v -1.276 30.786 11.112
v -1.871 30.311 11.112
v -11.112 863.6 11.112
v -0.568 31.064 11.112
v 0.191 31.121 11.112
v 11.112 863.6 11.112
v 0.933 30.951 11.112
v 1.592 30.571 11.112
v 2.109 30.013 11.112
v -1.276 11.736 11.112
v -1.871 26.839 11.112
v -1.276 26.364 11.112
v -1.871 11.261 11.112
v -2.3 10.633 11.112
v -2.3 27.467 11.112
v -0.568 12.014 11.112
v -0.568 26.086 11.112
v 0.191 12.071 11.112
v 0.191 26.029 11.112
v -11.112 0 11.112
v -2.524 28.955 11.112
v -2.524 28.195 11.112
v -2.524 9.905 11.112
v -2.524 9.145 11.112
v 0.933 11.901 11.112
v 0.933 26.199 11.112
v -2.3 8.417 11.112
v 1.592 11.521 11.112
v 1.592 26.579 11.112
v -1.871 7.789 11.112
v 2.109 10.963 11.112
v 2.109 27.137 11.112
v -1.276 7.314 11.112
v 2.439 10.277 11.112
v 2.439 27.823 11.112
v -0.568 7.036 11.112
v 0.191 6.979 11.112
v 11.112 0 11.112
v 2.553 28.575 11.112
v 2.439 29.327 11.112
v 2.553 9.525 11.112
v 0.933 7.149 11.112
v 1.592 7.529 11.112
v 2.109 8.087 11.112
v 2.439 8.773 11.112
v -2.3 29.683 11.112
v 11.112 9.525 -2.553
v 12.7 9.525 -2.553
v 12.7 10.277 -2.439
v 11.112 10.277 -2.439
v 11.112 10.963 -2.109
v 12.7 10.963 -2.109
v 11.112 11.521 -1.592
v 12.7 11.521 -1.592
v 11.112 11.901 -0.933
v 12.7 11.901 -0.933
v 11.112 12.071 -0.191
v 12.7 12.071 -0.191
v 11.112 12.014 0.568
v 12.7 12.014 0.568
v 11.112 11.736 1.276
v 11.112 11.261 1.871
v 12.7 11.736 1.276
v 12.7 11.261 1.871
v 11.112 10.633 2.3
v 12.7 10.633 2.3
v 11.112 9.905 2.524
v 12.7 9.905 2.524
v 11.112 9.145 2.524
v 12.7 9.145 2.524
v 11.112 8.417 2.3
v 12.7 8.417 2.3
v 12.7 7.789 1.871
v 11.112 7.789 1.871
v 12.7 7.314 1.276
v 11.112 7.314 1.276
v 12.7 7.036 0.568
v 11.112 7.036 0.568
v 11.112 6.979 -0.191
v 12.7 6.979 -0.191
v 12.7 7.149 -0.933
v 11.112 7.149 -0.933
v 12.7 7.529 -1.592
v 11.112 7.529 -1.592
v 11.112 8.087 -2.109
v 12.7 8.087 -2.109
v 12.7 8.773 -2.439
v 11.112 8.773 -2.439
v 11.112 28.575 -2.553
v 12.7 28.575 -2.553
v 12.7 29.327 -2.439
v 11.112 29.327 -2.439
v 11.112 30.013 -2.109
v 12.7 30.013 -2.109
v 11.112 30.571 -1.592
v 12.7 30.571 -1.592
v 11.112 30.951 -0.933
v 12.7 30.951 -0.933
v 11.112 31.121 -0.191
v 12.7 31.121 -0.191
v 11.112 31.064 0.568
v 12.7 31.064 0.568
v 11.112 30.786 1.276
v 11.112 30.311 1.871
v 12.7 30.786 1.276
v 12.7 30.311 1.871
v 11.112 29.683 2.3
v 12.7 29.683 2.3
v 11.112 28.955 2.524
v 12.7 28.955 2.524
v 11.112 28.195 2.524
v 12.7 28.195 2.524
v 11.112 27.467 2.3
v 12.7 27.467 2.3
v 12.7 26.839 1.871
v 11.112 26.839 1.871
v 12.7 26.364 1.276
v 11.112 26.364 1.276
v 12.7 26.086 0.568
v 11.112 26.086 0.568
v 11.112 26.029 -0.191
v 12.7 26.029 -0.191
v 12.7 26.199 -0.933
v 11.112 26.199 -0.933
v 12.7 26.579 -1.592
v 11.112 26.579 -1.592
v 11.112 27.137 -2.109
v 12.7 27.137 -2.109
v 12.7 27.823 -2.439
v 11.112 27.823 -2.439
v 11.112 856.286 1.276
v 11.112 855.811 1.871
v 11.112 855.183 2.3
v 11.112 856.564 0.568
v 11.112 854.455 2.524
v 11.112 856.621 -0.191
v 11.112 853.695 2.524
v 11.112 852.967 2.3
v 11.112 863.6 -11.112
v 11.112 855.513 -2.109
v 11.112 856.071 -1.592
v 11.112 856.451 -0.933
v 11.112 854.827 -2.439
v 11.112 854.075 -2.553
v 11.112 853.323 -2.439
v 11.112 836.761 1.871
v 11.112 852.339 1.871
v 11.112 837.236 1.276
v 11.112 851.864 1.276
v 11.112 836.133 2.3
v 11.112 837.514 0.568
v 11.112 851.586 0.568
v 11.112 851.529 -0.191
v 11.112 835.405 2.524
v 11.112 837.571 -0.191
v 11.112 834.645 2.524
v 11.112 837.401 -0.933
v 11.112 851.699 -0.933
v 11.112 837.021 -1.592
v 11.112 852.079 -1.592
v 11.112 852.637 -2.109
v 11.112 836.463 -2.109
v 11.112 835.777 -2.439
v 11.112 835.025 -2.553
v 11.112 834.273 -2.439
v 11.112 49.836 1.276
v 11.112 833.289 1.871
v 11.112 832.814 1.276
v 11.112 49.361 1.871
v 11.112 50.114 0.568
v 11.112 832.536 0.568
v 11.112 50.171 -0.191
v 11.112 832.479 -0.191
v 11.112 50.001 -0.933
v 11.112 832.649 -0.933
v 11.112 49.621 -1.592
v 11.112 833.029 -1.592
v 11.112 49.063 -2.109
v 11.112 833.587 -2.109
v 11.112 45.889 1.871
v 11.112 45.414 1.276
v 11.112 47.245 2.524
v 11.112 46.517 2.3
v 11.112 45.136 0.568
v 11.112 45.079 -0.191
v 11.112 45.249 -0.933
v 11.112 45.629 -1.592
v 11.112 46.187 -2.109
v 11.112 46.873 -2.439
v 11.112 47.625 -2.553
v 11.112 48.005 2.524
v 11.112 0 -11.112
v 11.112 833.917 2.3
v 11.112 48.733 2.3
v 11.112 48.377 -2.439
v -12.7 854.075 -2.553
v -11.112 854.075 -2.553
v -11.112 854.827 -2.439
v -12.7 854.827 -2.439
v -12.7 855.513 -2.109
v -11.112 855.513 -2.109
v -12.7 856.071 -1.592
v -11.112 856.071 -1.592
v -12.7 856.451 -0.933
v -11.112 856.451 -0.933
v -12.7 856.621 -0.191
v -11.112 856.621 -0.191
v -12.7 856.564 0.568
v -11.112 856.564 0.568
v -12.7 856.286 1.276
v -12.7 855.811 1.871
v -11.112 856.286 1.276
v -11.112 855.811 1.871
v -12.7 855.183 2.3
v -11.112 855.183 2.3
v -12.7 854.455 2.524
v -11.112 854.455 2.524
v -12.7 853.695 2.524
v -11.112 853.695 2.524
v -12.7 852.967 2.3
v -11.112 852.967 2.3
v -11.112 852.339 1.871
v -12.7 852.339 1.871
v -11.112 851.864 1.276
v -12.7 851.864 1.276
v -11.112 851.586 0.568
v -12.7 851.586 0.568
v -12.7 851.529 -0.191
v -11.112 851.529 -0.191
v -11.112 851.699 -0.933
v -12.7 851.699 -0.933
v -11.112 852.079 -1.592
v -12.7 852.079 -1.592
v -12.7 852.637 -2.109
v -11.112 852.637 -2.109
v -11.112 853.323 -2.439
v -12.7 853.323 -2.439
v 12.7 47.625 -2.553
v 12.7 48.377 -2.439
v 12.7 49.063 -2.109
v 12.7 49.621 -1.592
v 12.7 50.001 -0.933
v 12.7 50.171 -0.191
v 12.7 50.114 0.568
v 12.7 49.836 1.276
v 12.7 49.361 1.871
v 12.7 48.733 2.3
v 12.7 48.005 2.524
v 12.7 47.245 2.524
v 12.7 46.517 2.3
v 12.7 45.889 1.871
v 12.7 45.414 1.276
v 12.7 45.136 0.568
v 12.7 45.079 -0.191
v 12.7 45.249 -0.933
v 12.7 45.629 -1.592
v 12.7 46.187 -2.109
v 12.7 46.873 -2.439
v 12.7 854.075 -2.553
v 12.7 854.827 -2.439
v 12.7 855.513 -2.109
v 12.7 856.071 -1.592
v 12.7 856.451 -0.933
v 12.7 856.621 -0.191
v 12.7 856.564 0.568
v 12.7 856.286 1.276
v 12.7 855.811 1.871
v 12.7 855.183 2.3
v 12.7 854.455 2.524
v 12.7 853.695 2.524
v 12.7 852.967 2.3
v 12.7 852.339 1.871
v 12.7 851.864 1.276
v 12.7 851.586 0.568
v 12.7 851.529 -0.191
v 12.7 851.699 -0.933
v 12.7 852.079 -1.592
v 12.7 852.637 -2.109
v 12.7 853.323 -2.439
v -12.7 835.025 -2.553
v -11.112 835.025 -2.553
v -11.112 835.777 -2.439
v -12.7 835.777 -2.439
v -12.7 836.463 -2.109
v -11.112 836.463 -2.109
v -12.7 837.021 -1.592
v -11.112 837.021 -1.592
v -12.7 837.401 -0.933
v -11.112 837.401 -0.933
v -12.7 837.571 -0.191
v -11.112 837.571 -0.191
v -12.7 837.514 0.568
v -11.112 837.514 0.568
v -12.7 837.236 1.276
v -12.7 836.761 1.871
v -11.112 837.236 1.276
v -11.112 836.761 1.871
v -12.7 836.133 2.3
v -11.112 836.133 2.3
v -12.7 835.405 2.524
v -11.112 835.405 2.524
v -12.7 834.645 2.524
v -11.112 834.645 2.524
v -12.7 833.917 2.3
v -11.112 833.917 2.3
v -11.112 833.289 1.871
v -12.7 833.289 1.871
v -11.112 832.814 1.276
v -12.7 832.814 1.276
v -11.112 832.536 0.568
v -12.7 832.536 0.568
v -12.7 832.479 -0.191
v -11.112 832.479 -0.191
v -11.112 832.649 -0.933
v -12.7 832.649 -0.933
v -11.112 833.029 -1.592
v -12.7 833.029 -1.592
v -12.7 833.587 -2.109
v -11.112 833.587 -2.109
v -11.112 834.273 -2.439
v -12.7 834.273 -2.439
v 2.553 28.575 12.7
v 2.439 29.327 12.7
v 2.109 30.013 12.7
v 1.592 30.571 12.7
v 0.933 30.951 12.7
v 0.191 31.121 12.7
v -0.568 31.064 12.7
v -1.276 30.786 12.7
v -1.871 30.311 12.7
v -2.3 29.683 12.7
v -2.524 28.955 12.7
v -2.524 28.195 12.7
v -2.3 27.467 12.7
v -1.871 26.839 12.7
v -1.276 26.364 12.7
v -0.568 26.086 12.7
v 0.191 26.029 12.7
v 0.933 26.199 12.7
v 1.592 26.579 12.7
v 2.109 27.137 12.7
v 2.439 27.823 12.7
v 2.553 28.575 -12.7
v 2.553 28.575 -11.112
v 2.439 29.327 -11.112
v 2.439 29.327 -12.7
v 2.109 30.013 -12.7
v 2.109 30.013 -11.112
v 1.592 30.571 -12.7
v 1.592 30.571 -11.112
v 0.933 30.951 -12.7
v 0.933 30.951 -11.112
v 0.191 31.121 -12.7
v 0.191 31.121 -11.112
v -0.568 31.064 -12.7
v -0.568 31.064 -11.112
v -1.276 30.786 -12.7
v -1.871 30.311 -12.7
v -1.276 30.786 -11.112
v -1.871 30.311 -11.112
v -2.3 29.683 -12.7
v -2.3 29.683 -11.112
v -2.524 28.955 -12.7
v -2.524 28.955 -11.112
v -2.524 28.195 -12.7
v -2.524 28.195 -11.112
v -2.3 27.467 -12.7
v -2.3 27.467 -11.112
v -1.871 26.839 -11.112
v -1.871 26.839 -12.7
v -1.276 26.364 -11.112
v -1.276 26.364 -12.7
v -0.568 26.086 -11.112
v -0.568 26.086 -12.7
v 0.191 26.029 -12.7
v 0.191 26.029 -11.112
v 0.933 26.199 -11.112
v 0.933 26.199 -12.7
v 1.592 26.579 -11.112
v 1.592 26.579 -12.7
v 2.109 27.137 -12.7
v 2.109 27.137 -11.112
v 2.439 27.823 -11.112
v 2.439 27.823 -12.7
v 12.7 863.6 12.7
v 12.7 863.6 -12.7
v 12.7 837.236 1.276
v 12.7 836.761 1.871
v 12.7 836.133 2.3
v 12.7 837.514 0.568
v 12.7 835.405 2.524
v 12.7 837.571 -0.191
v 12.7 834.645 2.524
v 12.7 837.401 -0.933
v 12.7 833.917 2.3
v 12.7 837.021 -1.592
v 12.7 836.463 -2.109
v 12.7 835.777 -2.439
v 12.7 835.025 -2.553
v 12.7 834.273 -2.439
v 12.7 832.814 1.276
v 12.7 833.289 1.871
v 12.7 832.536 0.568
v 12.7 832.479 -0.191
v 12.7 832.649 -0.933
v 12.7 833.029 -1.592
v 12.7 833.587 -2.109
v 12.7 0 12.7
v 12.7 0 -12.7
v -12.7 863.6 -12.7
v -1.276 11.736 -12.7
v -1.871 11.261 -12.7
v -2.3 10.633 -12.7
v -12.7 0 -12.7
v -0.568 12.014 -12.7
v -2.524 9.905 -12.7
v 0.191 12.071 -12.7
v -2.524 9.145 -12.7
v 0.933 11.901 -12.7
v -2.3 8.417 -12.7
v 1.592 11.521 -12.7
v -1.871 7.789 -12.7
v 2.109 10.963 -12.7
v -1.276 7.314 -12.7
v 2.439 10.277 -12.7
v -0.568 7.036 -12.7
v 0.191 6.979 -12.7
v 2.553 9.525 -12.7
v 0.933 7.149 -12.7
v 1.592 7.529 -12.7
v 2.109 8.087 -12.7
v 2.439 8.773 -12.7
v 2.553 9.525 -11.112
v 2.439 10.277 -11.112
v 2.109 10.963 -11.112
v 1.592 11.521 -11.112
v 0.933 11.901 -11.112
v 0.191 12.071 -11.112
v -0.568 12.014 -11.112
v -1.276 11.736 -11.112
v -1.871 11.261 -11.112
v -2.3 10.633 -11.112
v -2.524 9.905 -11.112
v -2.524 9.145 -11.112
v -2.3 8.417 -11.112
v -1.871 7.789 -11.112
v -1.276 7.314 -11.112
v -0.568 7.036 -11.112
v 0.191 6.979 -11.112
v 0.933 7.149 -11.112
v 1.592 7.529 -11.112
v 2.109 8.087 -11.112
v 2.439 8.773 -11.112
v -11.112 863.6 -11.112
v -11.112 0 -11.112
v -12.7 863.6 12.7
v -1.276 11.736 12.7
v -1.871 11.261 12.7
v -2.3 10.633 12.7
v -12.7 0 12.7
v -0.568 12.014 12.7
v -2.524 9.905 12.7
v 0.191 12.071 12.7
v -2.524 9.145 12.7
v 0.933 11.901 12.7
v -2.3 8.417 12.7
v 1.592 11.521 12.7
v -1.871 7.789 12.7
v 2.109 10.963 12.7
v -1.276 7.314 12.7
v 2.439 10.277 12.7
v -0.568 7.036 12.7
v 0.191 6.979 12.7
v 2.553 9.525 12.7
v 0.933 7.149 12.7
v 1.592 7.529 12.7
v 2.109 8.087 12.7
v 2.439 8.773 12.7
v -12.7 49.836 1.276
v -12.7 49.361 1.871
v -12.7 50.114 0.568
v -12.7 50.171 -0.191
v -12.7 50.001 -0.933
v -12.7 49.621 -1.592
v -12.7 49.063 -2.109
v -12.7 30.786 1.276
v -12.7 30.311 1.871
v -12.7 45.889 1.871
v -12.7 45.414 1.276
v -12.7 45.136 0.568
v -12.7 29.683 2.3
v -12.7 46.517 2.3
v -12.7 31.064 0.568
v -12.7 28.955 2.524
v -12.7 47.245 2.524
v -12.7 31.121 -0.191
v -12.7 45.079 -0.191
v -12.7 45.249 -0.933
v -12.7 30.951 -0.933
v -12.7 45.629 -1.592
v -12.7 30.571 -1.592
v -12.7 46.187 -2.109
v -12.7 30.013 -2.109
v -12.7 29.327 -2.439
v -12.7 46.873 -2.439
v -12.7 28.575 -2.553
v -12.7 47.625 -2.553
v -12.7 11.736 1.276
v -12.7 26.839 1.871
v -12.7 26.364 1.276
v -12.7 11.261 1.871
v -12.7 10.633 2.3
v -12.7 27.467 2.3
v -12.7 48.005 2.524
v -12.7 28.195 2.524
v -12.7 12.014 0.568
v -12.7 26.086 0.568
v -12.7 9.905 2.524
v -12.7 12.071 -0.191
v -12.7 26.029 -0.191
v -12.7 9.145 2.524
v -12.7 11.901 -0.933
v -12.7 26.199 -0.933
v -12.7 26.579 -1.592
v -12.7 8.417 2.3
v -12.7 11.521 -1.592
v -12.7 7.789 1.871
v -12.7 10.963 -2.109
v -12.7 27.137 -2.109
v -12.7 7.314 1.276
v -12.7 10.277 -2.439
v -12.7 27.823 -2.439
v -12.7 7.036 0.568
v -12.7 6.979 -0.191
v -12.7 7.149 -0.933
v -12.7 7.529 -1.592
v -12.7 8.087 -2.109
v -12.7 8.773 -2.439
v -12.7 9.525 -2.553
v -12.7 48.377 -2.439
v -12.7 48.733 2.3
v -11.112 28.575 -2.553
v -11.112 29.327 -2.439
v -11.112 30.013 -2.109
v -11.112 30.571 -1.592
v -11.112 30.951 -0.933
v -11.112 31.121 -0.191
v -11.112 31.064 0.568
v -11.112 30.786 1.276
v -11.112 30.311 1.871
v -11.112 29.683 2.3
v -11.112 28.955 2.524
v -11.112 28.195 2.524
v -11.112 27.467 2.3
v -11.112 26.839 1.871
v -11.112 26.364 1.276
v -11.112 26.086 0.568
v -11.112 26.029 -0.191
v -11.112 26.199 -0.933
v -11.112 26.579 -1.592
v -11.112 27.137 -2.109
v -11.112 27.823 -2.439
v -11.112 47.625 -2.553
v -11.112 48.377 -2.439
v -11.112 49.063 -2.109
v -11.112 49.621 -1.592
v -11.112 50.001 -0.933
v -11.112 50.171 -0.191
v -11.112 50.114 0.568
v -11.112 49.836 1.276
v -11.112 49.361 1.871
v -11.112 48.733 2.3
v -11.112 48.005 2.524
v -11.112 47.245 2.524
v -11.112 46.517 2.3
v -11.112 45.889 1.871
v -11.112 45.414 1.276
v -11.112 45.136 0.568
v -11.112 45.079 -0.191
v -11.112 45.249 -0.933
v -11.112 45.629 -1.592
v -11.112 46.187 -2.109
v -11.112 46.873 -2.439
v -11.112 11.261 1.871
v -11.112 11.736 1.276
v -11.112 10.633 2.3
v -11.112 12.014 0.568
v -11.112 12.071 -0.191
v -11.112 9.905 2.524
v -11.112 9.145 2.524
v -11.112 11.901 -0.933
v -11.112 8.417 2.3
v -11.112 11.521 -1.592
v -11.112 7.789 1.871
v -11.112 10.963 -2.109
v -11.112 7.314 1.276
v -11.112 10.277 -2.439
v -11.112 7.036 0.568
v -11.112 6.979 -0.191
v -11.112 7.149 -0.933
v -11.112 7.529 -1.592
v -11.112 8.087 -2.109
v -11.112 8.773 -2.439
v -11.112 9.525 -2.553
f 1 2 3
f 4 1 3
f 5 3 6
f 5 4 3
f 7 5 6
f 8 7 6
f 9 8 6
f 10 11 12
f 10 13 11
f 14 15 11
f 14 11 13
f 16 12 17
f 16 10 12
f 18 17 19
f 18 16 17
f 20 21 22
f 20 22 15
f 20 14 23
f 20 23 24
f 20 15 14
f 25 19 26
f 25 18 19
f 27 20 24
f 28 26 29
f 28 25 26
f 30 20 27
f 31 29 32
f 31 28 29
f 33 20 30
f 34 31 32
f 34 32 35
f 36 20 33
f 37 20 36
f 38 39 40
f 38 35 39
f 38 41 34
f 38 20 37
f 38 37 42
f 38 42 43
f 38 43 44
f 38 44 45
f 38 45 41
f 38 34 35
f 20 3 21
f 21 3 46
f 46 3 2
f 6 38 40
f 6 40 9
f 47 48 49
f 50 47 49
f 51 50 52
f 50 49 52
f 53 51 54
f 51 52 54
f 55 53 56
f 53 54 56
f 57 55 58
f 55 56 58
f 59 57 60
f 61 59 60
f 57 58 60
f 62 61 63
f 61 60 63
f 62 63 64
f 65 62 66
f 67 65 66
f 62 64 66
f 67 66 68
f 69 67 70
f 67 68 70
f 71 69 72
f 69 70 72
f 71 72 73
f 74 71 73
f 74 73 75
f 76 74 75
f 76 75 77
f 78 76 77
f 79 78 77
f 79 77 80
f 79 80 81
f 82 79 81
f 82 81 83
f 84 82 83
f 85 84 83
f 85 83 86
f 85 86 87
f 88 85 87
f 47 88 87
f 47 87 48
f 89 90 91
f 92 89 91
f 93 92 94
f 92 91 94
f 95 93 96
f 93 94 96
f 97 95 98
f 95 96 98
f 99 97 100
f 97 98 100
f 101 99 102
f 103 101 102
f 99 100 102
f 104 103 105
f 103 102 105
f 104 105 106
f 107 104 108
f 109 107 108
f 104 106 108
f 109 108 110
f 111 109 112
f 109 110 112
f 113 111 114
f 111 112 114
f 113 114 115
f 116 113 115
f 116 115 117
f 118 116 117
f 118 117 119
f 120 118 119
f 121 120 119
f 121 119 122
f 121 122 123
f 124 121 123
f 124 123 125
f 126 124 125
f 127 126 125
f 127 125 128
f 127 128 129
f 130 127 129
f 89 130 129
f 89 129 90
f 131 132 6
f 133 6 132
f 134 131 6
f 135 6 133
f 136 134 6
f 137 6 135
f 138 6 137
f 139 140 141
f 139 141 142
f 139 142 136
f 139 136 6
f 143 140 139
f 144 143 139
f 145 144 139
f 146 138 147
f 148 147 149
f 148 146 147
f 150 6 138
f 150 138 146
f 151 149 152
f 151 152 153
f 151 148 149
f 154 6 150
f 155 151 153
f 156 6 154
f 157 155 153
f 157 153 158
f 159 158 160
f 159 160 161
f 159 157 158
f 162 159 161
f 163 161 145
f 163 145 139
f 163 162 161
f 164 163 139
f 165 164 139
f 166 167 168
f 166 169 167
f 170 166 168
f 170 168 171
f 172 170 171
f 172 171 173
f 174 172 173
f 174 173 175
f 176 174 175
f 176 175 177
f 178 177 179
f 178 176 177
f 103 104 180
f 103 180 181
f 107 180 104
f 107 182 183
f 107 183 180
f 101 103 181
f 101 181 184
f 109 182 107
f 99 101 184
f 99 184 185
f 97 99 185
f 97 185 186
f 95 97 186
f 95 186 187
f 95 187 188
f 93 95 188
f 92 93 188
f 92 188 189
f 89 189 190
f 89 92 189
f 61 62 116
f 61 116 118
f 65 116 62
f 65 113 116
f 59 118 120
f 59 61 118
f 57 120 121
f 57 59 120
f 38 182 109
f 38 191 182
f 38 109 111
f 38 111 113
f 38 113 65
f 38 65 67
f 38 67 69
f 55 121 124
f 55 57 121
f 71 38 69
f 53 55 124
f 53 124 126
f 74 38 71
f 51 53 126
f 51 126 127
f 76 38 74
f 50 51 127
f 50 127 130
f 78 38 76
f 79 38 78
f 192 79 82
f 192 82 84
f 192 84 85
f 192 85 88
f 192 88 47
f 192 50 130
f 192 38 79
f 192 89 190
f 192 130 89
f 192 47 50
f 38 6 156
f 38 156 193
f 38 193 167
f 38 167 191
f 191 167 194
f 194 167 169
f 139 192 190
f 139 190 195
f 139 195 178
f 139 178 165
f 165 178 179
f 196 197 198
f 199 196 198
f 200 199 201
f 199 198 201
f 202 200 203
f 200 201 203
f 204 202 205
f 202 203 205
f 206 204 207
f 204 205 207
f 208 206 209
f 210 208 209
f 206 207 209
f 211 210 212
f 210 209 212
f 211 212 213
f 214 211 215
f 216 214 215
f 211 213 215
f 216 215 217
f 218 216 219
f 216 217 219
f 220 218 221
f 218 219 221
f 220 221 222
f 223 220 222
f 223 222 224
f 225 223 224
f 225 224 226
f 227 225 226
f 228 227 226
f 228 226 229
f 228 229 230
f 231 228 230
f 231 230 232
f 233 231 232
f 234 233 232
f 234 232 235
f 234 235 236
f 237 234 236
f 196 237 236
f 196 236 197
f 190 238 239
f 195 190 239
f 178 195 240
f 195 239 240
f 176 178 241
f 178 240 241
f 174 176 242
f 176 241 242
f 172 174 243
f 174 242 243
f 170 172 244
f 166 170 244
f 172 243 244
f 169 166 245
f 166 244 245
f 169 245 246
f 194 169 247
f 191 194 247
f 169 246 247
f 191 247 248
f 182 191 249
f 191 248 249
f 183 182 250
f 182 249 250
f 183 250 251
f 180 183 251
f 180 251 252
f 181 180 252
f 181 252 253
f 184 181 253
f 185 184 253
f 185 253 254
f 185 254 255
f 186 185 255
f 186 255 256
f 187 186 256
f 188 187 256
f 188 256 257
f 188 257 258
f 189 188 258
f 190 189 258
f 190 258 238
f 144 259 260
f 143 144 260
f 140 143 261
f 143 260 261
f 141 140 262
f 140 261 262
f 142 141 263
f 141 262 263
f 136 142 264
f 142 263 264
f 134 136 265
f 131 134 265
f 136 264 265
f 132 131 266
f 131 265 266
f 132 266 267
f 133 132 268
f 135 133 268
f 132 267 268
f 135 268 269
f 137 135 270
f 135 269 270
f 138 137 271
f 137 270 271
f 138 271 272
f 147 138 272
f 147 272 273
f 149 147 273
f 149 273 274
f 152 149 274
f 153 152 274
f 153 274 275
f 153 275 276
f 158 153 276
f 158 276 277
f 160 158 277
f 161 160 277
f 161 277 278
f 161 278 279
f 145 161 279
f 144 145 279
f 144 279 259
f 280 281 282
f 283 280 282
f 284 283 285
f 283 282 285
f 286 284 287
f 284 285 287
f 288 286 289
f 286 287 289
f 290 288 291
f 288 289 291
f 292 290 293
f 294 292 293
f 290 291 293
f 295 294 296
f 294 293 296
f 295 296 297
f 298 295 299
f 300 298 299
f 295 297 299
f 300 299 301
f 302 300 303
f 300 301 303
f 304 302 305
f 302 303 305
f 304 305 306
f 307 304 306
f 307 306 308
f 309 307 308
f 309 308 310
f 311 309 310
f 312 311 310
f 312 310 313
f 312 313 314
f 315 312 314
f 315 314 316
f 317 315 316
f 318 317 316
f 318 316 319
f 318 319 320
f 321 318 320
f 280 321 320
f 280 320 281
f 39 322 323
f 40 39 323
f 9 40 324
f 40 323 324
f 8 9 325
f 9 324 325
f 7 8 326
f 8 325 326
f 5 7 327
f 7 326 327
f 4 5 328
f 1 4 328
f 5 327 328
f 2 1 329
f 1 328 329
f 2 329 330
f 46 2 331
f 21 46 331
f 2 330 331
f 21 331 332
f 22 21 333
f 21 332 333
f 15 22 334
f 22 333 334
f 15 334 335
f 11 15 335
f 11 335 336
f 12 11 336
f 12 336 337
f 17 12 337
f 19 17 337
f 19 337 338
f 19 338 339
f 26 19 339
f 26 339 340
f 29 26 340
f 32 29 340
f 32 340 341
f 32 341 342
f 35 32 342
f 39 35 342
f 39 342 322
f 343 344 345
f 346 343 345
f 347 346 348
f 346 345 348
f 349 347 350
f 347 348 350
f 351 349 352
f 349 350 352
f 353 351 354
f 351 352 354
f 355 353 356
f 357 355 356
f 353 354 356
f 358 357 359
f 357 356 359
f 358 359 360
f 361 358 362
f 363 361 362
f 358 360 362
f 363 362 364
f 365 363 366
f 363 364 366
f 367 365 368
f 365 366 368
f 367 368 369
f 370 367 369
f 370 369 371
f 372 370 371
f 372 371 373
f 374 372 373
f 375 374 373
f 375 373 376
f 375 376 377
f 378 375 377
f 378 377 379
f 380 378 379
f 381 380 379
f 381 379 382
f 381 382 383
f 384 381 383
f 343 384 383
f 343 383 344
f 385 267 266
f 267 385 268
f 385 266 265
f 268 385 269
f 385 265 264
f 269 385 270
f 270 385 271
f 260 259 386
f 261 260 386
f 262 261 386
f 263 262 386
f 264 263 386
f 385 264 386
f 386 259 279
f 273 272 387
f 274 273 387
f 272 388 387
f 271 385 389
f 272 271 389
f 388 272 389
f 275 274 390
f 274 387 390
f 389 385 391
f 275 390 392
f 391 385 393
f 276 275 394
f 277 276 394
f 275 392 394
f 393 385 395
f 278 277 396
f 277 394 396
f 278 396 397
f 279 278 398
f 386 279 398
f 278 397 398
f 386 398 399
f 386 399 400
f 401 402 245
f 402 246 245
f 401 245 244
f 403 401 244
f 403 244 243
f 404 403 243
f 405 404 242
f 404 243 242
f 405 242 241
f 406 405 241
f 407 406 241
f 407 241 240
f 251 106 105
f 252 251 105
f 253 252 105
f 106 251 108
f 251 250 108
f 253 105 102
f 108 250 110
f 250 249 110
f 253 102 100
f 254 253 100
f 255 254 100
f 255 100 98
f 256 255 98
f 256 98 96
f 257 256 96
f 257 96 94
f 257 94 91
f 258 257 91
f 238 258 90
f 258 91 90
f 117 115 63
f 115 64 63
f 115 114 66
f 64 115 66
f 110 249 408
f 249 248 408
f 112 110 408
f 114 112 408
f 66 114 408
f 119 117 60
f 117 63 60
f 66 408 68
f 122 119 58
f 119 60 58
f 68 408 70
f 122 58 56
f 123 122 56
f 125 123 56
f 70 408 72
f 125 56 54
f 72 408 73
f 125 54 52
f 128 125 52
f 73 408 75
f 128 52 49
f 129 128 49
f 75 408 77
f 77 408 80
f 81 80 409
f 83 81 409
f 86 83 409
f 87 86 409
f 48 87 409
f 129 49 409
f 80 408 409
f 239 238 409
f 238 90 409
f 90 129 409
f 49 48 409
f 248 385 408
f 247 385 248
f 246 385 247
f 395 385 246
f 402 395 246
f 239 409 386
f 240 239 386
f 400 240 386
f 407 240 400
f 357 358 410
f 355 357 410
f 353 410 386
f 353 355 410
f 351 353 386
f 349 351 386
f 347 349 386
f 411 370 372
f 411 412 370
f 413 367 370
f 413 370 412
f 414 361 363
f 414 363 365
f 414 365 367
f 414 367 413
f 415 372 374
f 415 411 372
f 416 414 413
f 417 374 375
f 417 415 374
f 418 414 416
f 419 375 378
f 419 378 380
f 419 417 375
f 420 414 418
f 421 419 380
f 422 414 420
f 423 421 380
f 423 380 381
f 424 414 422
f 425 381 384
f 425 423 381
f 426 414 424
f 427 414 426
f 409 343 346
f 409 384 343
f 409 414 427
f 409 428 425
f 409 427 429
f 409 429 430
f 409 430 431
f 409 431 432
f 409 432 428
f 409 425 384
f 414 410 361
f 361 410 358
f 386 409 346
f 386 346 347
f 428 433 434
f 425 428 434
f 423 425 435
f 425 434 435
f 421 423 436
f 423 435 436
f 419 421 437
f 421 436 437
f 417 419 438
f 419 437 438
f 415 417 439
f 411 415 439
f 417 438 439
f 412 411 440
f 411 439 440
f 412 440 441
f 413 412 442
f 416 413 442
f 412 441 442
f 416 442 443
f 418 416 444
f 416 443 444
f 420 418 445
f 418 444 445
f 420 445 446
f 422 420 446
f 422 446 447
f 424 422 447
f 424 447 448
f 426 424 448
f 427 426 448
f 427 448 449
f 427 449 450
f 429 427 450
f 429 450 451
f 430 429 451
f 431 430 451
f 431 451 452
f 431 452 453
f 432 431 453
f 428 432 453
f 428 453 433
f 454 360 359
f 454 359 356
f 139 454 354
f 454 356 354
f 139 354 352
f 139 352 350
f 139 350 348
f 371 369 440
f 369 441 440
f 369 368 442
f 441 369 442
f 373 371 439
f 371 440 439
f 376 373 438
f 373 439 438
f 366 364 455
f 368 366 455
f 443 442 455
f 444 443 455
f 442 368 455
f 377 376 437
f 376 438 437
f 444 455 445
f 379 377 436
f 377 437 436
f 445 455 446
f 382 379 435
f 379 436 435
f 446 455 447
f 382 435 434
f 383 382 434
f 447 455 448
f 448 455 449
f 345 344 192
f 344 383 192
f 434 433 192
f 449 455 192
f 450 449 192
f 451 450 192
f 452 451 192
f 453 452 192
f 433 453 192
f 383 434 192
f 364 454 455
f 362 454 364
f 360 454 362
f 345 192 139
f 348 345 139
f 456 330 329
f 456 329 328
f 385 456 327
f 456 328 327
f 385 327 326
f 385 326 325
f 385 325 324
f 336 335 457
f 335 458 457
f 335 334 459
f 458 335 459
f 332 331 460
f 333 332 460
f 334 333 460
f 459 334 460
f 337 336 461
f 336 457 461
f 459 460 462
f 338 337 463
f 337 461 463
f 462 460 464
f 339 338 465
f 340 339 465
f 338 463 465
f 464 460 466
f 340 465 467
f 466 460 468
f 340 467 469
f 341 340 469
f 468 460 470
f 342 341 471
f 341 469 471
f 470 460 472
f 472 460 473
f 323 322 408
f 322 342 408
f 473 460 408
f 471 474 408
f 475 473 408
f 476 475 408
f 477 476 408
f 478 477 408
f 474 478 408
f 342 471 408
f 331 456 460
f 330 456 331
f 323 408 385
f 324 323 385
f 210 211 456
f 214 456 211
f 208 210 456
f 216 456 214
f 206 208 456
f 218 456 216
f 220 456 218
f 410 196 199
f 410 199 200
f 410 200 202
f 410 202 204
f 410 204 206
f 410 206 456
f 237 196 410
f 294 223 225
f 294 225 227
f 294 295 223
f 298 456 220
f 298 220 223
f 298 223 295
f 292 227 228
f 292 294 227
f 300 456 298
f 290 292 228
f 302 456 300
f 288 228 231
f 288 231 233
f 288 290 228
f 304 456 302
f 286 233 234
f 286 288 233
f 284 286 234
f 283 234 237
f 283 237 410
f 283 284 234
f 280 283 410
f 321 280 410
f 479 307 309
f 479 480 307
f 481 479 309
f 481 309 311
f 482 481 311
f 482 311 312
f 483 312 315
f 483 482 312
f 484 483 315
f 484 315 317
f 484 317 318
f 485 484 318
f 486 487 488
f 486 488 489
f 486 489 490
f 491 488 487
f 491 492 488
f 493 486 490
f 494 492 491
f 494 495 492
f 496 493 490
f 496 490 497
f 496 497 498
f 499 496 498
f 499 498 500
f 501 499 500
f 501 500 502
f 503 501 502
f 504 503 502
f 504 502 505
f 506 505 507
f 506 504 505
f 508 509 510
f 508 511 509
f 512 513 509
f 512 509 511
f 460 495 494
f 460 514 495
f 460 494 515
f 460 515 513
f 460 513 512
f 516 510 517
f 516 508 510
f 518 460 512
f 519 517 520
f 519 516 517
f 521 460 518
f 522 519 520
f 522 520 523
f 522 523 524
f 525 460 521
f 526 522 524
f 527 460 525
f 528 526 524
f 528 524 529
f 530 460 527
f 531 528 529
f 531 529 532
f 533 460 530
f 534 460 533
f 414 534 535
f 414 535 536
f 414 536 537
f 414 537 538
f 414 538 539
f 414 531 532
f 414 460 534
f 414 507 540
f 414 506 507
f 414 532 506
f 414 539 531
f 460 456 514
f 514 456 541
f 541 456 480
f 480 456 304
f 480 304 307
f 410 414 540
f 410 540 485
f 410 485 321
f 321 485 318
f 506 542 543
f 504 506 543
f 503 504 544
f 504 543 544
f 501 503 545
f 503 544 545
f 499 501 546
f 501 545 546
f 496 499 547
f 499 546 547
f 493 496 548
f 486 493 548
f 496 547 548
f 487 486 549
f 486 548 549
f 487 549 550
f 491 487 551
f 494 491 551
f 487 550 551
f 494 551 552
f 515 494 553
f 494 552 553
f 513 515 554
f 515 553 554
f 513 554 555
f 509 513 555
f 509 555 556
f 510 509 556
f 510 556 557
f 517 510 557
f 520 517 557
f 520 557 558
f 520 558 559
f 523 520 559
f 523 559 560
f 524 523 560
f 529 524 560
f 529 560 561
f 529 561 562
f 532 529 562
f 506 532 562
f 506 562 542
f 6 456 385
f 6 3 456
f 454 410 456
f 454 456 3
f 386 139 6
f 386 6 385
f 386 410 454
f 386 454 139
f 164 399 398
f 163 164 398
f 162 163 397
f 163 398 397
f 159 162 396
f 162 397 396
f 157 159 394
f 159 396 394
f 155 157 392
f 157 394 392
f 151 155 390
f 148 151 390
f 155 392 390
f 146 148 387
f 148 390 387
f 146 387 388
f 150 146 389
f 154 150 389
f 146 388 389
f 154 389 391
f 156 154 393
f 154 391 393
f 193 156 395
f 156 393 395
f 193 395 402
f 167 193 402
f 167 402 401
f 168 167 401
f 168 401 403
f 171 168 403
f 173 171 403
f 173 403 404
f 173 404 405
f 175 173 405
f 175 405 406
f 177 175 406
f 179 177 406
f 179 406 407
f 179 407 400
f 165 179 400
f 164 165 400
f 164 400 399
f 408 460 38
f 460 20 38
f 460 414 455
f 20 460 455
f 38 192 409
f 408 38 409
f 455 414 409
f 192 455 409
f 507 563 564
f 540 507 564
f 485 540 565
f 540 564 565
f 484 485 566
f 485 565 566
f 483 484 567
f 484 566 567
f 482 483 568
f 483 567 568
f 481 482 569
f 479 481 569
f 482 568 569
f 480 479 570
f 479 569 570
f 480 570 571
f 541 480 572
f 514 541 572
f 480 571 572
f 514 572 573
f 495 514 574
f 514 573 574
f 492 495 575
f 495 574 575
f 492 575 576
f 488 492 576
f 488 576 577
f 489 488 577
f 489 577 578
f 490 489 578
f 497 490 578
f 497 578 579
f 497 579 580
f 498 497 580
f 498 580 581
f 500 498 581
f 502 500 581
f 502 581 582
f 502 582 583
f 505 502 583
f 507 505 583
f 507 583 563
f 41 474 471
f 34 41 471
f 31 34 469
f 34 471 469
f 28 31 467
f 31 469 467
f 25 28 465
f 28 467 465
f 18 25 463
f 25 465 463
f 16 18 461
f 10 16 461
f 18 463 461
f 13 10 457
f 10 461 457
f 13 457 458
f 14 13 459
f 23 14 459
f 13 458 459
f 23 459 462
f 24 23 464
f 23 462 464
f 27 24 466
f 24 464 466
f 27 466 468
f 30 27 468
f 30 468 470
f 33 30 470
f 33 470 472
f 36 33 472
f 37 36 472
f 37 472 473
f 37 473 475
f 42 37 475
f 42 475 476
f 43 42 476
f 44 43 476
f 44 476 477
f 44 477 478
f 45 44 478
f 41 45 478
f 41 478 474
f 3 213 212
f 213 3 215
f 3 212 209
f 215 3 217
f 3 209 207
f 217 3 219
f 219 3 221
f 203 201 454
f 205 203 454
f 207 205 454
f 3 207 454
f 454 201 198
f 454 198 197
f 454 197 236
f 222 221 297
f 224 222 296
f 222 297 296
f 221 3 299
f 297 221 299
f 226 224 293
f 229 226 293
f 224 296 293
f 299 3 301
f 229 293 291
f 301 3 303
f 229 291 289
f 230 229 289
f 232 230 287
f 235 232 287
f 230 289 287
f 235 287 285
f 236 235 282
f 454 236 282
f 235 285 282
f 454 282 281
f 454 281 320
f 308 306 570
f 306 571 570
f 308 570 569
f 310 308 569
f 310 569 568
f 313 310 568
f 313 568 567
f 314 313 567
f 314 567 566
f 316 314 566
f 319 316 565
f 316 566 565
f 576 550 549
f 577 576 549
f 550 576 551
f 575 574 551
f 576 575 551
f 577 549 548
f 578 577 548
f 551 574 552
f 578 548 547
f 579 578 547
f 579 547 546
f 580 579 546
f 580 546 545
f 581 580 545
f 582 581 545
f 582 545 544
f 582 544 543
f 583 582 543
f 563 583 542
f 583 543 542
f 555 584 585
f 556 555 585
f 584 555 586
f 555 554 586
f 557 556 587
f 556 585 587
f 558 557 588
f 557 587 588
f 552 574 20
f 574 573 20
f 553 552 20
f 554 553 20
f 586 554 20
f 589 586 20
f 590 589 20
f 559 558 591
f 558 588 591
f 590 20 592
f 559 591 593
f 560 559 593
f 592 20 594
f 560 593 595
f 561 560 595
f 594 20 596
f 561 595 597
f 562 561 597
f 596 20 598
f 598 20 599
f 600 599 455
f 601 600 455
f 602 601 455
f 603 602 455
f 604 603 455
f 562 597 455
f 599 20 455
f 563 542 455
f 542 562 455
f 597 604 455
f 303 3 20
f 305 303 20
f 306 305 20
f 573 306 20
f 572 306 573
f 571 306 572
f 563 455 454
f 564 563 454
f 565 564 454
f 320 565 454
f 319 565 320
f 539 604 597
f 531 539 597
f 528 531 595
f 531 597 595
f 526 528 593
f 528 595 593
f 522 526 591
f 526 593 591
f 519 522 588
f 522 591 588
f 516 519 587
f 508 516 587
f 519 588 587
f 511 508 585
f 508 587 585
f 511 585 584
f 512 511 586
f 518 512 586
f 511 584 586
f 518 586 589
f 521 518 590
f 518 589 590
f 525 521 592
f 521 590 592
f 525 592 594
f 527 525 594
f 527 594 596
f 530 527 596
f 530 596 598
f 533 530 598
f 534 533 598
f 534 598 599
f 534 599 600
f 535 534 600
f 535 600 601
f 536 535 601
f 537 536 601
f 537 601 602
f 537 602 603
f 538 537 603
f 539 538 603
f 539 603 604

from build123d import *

# Parameters (mm, degrees)
SKETCH1_W           = 25.4
SKETCH1_H           = 25.4
SKETCH1_W_2         = 22.225
SKETCH1_H_2         = 22.225
BOSS_EXTRUDE1_DEPTH = 863.6
SKETCH2_R           = 2.5527
CUT_EXTRUDE1_DEPTH  = 865.066785613
SKETCH3_R           = 2.5527
CUT_EXTRUDE2_DEPTH  = 865.066785613


with BuildPart() as part:
    # Sketch1 → Boss-Extrude1 (new body)
    with BuildSketch(Plane(origin=(0, 0, 0), x_dir=(1, 0, 0), z_dir=(0, 1, 0))):
        Rectangle(SKETCH1_W, SKETCH1_H)
        Rectangle(SKETCH1_W_2, SKETCH1_H_2, mode=Mode.SUBTRACT)
    extrude(amount=BOSS_EXTRUDE1_DEPTH)

    # Sketch2 → Cut-Extrude1 (cut, through all)
    with BuildSketch(Plane.XY.offset(12.7)):
        with Locations((0, 9.525)):
            Circle(SKETCH2_R)
        with Locations((0, 28.575)):
            Circle(SKETCH2_R)
    extrude(amount=-CUT_EXTRUDE1_DEPTH, mode=Mode.SUBTRACT)

    # Sketch3 → Cut-Extrude2 (cut, through all)
    with BuildSketch(Plane(origin=(12.7, 0, 0), x_dir=(0, 0, -1), z_dir=(1, 0, 0))):
        with Locations((0, 9.525)):
            Circle(SKETCH3_R)
        with Locations((0, 28.575)):
            Circle(SKETCH3_R)
        with Locations((0, 47.625)):
            Circle(SKETCH3_R)
        with Locations((0, 854.075)):
            Circle(SKETCH3_R)
        with Locations((0, 835.025)):
            Circle(SKETCH3_R)
    extrude(amount=-CUT_EXTRUDE2_DEPTH, mode=Mode.SUBTRACT)


solid = part.part
